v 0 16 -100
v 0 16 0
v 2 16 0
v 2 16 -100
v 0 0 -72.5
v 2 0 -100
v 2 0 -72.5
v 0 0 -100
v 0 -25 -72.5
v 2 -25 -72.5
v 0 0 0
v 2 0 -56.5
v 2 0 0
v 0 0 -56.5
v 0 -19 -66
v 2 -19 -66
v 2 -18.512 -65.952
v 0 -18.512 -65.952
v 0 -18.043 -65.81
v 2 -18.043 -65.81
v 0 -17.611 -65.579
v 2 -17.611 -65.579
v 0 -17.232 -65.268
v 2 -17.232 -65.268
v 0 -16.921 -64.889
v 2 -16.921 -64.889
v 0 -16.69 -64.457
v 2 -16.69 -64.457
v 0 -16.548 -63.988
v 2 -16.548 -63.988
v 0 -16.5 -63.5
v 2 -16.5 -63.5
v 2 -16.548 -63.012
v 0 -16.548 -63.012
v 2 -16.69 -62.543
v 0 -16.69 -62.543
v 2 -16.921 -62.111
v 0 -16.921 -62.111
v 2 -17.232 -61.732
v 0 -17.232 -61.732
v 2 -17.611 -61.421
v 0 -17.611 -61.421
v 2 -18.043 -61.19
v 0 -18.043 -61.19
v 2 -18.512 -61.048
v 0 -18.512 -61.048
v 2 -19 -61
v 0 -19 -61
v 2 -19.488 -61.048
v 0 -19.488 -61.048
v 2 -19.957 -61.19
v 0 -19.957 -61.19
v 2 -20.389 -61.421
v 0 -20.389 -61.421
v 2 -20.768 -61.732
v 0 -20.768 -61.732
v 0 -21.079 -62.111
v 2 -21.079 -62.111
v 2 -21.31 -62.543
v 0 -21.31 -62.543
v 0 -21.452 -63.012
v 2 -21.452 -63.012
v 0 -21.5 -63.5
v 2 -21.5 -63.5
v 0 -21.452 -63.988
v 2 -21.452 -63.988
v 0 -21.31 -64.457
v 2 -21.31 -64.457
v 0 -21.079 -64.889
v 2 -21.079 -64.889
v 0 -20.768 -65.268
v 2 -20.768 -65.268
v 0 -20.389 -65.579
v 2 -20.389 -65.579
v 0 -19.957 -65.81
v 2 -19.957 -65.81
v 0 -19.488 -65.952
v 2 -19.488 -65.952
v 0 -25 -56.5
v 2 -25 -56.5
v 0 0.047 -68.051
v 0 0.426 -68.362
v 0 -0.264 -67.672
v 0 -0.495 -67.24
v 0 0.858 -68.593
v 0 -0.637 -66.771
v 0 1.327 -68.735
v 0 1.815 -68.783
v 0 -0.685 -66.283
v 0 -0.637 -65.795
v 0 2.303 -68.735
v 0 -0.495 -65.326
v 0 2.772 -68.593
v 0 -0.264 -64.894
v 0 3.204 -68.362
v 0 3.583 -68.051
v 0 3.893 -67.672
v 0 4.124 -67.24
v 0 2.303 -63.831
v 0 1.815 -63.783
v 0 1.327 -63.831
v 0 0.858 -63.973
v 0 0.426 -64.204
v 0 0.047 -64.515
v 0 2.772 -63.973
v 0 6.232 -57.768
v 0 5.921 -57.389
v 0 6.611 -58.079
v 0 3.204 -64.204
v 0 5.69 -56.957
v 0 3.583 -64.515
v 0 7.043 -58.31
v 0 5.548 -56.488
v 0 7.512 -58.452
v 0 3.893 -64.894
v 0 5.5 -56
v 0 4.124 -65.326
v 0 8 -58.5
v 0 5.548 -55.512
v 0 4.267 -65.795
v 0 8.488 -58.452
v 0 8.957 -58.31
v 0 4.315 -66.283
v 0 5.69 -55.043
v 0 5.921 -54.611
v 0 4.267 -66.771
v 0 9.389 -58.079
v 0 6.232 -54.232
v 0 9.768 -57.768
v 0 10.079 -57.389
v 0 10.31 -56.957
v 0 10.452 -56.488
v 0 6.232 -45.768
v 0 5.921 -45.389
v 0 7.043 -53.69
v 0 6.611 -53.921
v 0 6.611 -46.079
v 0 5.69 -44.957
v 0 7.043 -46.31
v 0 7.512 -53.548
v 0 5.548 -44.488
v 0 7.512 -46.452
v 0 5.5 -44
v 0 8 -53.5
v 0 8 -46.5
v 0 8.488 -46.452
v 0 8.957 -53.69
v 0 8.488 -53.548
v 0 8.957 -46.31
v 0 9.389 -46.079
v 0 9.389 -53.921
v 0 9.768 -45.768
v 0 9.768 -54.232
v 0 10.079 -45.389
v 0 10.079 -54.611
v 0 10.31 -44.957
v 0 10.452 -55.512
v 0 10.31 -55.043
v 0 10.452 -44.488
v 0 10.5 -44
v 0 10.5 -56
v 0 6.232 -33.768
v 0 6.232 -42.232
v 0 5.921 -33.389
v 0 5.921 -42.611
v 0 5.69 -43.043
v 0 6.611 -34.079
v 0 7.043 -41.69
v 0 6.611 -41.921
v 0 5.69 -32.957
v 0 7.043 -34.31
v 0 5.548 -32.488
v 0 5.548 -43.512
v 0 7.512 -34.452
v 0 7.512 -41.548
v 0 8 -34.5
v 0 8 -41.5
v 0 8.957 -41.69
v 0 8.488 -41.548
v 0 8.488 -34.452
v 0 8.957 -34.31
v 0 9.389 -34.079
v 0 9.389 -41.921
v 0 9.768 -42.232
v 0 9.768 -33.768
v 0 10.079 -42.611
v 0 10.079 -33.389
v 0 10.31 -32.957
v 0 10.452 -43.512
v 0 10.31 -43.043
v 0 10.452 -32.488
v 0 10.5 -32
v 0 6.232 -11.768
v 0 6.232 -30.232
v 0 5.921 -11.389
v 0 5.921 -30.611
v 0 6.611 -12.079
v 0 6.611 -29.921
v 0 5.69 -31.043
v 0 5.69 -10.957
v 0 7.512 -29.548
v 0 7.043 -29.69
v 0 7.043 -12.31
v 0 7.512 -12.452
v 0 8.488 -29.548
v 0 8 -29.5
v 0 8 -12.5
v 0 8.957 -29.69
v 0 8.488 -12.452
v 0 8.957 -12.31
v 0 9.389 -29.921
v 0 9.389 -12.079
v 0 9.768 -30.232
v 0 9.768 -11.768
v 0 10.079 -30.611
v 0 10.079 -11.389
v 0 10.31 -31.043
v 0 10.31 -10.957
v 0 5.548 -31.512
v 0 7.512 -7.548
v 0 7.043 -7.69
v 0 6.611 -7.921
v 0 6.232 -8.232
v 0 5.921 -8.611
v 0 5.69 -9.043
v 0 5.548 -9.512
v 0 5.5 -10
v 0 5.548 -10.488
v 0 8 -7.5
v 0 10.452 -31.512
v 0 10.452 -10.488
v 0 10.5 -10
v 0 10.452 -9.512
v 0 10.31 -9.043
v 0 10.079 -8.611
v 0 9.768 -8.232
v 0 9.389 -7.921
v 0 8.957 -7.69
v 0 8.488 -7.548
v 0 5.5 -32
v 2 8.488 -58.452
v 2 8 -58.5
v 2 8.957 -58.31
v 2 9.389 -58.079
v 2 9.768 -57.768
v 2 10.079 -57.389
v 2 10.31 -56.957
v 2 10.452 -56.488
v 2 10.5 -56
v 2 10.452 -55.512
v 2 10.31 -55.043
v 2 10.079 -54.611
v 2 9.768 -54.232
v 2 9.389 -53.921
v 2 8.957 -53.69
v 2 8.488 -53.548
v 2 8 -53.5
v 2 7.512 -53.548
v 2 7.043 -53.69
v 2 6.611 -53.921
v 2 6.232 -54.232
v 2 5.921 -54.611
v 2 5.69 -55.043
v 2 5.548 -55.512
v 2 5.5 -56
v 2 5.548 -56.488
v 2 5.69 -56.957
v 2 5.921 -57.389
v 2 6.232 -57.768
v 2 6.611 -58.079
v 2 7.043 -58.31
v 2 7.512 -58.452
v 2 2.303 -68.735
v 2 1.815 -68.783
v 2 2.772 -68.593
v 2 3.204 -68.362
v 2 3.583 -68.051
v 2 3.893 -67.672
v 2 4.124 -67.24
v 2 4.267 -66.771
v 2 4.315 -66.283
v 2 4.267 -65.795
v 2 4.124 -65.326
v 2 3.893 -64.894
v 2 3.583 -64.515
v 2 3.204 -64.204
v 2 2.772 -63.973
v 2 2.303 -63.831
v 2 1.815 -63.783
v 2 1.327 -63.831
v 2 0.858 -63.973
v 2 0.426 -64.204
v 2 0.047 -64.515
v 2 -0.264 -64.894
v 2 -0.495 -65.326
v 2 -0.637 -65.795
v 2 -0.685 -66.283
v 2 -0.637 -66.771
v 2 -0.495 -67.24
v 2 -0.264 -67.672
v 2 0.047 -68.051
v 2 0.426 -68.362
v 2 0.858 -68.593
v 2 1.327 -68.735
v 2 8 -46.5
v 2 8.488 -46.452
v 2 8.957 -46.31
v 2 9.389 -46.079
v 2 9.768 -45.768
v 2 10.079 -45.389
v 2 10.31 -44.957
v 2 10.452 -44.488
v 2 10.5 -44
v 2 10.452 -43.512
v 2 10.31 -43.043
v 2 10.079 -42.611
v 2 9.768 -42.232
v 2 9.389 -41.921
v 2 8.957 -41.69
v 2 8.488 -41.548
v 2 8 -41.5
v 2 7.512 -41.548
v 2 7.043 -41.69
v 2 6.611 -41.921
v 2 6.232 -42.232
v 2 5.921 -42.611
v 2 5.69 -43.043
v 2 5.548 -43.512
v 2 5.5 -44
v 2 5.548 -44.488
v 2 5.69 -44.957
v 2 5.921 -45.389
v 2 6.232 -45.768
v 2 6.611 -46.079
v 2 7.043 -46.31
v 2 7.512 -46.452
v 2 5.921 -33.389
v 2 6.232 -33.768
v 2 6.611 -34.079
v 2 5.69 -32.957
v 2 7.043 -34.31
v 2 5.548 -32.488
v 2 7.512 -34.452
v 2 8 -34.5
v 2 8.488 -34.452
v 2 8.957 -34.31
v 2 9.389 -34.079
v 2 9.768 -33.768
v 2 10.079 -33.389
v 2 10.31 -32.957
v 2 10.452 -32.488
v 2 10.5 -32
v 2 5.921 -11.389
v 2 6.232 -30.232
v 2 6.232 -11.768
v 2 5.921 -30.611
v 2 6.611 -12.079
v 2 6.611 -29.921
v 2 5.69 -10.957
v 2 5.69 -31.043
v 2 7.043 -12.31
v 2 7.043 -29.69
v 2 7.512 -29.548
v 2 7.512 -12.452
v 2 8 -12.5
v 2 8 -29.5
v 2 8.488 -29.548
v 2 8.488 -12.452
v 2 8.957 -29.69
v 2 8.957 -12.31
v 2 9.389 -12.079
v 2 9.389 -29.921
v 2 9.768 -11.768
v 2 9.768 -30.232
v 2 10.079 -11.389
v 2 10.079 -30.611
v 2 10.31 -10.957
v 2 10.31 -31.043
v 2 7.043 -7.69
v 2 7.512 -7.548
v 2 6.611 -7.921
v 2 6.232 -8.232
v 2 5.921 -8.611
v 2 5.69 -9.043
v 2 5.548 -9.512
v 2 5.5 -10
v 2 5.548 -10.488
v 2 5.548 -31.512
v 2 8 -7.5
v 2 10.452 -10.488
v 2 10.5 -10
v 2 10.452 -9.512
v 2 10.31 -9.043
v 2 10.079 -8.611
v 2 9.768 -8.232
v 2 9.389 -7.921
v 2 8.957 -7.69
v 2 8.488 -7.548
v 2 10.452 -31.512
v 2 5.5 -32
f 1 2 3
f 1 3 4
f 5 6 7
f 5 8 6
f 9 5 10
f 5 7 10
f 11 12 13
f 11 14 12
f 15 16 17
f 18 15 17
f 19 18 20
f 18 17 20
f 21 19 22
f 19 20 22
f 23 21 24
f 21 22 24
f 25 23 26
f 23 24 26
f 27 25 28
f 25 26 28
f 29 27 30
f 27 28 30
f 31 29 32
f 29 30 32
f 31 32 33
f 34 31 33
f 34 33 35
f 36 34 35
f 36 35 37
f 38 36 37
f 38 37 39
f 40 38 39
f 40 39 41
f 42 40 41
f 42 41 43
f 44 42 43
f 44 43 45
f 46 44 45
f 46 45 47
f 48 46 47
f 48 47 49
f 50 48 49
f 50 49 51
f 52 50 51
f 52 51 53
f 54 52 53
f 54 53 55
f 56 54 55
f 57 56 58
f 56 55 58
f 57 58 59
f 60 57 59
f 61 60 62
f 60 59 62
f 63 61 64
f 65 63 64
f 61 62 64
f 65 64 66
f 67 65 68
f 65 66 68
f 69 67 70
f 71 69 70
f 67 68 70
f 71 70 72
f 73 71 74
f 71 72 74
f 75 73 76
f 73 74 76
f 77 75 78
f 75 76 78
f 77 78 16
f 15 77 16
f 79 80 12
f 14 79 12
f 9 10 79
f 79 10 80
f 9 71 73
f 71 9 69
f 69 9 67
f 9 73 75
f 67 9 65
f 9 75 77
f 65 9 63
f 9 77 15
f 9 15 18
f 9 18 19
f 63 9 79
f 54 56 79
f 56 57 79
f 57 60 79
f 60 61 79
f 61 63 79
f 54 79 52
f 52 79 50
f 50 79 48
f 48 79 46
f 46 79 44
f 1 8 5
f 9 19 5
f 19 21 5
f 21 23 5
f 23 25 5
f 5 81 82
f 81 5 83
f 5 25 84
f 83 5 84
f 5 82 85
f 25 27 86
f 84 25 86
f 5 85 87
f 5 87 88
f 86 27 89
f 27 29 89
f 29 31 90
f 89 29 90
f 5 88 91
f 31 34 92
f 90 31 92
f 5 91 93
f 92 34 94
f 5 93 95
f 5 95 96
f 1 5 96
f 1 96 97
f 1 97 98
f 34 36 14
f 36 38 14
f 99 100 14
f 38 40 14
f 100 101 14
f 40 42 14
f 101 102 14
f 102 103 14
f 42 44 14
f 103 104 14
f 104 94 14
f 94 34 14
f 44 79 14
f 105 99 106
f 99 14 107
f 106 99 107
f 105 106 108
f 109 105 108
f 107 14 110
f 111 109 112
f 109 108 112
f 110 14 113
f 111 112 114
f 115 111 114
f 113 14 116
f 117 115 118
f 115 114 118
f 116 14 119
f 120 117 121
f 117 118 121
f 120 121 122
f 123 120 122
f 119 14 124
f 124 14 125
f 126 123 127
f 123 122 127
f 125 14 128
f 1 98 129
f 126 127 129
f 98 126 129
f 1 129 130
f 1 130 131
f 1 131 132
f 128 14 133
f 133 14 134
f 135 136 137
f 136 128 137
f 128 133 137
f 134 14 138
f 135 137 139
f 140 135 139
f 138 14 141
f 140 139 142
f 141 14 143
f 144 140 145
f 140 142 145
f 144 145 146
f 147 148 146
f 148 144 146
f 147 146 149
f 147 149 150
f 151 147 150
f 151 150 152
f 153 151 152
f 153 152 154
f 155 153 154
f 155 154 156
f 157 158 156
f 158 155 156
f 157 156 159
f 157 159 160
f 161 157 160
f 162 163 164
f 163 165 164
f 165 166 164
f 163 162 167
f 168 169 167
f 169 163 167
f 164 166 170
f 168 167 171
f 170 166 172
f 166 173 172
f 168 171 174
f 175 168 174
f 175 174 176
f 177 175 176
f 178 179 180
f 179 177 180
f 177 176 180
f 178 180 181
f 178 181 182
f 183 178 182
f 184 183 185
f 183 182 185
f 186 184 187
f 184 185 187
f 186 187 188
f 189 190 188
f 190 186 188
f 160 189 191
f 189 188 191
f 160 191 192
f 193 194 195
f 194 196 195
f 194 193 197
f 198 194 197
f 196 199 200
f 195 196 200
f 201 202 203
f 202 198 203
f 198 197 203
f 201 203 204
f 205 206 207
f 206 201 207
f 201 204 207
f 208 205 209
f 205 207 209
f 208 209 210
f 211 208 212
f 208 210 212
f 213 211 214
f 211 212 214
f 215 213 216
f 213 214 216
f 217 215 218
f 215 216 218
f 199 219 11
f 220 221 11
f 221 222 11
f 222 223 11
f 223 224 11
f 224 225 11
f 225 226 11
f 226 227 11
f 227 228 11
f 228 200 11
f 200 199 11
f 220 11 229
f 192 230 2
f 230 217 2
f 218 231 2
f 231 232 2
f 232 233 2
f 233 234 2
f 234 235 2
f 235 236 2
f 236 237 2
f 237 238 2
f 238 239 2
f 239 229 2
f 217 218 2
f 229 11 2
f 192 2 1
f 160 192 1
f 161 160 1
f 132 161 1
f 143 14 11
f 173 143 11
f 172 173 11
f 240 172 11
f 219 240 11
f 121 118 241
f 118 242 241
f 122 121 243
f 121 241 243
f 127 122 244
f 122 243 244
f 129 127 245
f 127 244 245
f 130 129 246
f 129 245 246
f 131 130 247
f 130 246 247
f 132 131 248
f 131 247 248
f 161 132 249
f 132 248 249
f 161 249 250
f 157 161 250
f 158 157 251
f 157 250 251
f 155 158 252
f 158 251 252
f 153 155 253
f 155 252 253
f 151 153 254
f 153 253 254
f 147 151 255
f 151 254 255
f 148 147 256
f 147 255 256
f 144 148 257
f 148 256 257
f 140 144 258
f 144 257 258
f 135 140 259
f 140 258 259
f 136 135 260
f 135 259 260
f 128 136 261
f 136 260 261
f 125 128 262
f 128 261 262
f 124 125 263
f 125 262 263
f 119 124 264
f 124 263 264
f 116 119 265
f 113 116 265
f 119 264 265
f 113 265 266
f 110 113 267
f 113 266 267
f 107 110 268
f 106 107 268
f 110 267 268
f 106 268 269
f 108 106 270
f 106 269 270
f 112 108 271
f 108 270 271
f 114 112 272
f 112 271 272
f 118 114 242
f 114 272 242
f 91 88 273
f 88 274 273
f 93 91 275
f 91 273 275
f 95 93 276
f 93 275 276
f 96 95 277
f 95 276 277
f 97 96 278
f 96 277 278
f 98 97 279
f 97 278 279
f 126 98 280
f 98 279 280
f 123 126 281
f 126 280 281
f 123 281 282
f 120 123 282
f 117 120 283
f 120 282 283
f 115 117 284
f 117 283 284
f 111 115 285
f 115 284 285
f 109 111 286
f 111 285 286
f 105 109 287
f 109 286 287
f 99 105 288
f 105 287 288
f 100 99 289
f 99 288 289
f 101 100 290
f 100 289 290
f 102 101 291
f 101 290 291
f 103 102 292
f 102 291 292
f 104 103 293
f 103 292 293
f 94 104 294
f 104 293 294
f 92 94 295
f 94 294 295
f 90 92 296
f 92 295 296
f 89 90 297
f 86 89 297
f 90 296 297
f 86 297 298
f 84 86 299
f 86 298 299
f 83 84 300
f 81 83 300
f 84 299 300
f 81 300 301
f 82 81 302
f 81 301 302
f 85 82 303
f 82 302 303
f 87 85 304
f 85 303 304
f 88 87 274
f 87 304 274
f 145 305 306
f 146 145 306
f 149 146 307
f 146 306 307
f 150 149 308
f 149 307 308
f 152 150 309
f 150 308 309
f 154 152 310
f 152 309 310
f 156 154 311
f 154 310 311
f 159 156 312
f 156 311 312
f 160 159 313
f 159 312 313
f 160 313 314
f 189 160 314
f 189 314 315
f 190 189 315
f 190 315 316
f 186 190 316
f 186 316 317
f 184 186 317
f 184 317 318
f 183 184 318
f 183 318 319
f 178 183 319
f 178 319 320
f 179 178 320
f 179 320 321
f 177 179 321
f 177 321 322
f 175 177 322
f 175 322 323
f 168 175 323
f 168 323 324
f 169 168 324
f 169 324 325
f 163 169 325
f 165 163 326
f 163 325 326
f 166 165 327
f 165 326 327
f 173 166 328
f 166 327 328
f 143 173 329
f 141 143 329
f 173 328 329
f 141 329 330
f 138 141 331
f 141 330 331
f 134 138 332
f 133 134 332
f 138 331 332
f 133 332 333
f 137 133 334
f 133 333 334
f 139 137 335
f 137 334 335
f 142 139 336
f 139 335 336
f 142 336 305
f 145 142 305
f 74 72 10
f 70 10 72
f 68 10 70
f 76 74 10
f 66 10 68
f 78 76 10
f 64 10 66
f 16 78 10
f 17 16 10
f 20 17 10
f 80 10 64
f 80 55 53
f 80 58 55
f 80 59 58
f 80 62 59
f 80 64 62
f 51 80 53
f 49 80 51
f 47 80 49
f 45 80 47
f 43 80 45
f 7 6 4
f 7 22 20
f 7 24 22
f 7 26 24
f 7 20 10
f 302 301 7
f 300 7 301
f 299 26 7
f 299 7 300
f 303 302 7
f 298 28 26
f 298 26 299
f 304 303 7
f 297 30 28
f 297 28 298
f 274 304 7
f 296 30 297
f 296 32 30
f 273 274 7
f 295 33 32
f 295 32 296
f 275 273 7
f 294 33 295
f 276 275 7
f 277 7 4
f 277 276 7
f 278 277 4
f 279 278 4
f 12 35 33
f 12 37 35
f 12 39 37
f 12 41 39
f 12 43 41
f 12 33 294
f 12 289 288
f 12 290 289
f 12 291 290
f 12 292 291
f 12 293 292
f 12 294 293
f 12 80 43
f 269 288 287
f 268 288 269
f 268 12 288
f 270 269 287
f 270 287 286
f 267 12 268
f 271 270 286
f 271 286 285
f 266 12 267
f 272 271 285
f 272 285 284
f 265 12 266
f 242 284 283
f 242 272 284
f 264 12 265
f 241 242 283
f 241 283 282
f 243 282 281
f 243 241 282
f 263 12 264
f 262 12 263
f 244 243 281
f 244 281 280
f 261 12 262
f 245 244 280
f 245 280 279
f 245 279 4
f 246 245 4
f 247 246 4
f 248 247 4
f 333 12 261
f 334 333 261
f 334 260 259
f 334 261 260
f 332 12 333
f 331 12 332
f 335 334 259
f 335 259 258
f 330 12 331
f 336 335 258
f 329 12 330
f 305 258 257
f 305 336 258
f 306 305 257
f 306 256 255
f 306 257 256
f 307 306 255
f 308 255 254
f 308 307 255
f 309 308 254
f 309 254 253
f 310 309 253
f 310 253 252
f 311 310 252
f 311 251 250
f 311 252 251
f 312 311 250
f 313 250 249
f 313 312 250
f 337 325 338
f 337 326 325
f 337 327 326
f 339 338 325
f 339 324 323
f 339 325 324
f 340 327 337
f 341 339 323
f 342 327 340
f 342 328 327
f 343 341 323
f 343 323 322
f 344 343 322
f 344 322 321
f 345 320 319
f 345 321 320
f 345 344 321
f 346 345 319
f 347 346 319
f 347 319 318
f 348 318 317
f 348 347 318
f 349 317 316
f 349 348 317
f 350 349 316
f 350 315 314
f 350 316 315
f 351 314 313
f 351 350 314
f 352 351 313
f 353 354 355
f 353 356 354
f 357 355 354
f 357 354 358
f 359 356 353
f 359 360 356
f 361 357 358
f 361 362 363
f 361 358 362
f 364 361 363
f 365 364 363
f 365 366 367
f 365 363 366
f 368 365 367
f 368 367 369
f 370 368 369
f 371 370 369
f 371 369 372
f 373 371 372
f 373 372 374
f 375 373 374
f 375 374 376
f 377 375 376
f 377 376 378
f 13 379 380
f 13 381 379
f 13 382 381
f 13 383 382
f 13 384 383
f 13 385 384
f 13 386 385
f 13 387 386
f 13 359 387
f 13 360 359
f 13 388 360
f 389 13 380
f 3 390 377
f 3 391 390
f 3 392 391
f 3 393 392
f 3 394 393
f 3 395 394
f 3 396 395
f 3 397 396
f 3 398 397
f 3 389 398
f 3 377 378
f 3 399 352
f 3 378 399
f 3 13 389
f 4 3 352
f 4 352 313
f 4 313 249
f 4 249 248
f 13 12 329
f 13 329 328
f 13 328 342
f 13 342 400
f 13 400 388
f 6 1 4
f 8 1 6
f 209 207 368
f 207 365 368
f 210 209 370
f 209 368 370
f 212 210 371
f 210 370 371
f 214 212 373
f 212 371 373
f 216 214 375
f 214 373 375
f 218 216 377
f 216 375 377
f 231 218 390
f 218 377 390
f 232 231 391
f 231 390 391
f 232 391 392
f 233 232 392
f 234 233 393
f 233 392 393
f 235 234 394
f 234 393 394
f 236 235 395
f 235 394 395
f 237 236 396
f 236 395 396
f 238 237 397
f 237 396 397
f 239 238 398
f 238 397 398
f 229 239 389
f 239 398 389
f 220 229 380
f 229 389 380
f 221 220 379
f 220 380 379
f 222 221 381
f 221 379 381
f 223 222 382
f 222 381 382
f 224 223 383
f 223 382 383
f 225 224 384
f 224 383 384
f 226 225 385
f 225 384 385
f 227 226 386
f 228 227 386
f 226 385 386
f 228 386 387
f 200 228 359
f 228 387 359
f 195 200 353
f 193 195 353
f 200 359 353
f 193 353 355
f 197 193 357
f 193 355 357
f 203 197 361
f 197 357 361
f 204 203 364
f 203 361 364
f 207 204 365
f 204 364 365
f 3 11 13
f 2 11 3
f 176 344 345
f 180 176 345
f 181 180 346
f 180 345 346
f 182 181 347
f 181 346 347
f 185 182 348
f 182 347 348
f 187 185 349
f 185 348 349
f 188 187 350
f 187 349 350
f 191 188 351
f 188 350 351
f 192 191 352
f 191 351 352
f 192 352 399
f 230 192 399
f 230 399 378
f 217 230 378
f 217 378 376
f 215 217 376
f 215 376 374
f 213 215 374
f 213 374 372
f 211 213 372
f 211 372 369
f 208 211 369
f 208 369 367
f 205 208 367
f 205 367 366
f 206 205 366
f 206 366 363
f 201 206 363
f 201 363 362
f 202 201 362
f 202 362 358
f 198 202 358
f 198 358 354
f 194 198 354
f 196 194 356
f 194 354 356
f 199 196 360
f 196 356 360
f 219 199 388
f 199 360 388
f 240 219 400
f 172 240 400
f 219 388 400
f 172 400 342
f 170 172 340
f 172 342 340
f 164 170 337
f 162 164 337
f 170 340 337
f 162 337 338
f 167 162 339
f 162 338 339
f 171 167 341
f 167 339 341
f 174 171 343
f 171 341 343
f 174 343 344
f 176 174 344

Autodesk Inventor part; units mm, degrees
ref_plane "YZ Plane" through (0, 0, 0) normal (1, 0, 0) x (0, 1, 0)
ref_plane "XZ Plane" through (0, 0, 0) normal (0, 1, 0) x (-1, 0, 0)
ref_plane "XY Plane" through (0, 0, 0) normal (0, 0, 1) x (1, 0, 0)
sketch "Sketch1" plane through (0, 0, 0) normal (1, 0, 0) x (0, 1, 0)
  line L0 (0, 0) -> (16, 0)
  line L1 (16, 0) -> (16, -100)
  line L2 (16, -100) -> (0, -100)
  line L3 (0, -10) -> (0, -10)
  line L4 (0, -10) -> (0, -25)
  line L5 (0, -25) -> (0, -25)
  line L6 (0, -90) -> (0, -90)
  line L7 (0, -90) -> (0, -75)
  line L8 (0, -75) -> (0, -75)
  line L9 (0, -10) -> (0, 0)
  line L10 (0, -100) -> (0, -90)
  line L11 (0, -75) -> (0, -25)
  dimension "d0" = 16
  dimension "d1" = 100
  dimension "d2" = 0
  dimension "d3" = 15
  dimension "d4" = 10
  dimension "d5" = 15
  dimension "d6" = 10
  dimension "d10" = 0
  dimension "d11" = 0
  dimension "d12" = 0
extrude "Extrusion1" add sketch "Sketch1" along normal blind 2
sketch "Sketch3" plane through (2, 0, 0) normal (1, 0, 0) x (0, 0, -1)
  circle A0 centre (10, 8) radius 2.5
  circle A1 centre (32, 8) radius 2.5
  circle A2 centre (44, 8) radius 2.5
  line L0 (0, 16) -> (0, 0) projected
  line L1 (100, 16) -> (0, 16) projected
  circle A3 centre (56, 8) radius 2.5
  dimension "d18" = 5
  dimension "d19" = 5
  dimension "d20" = 5
  dimension "d21" = 10
  dimension "d22" = 8
  dimension "d23" = 8
  dimension "d24" = 22
  dimension "d25" = 8
  dimension "d26" = 12
  dimension "d29" = 5
  dimension "d31" = 8
  dimension "d32" = 12
extrude "Extrusion3" cut sketch "Sketch3" against normal blind 10 contours A0 | A1 | A2
extrude "Extrusion4" cut sketch "Sketch3" against normal blind 10 contours A3
sketch "Sketch5" plane through (2, 0, 0) normal (1, 0, 0) x (0, 0, -1)
  line L0 (0, 0) -> (100, 0) projected
  circle A0 centre (63.5, -19) radius 2.5 projected
  line L1 (56.5, 0) -> (72.5, 0)
  line L2 (72.5, 0) -> (72.5, -25)
  line L3 (72.5, -25) -> (56.5, -25)
  line L4 (56.5, -25) -> (56.5, 0)
  circle A1 centre (66.2831, 1.8148) radius 2.5
  circle A2 centre (56, 8) radius 6 construction
  circle A3 centre (63.5, -19) radius 15 construction
  circle A4 centre (66.2831, 1.8148) radius 6 construction
  dimension "d44" = 16
  dimension "d45" = 25
  dimension "d46" = 9
  dimension "d52" = 5
  dimension "d56" = 12
  dimension "d57" = 30
  dimension "d58" = 12
extrude "Extrusion6" add sketch "Sketch5" against normal blind 2 contours L0 A1 L2 L3 L4 | L0 A1 picked at (65.8534, -0.1091)
sketch "Sketch6" plane through (2, 0, 0) normal (1, 0, 0) x (0, 0, -1)
  circle A0 centre (66.2831, 1.8148) radius 2.5 projected
  circle A1 centre (66.2831, 1.8148) radius 2.5
  point P0 (0, 0)
  dimension "d53" = 5
extrude "Extrusion7" cut sketch "Sketch6" against normal blind 3
properties part number "Mounting_wall_2"
